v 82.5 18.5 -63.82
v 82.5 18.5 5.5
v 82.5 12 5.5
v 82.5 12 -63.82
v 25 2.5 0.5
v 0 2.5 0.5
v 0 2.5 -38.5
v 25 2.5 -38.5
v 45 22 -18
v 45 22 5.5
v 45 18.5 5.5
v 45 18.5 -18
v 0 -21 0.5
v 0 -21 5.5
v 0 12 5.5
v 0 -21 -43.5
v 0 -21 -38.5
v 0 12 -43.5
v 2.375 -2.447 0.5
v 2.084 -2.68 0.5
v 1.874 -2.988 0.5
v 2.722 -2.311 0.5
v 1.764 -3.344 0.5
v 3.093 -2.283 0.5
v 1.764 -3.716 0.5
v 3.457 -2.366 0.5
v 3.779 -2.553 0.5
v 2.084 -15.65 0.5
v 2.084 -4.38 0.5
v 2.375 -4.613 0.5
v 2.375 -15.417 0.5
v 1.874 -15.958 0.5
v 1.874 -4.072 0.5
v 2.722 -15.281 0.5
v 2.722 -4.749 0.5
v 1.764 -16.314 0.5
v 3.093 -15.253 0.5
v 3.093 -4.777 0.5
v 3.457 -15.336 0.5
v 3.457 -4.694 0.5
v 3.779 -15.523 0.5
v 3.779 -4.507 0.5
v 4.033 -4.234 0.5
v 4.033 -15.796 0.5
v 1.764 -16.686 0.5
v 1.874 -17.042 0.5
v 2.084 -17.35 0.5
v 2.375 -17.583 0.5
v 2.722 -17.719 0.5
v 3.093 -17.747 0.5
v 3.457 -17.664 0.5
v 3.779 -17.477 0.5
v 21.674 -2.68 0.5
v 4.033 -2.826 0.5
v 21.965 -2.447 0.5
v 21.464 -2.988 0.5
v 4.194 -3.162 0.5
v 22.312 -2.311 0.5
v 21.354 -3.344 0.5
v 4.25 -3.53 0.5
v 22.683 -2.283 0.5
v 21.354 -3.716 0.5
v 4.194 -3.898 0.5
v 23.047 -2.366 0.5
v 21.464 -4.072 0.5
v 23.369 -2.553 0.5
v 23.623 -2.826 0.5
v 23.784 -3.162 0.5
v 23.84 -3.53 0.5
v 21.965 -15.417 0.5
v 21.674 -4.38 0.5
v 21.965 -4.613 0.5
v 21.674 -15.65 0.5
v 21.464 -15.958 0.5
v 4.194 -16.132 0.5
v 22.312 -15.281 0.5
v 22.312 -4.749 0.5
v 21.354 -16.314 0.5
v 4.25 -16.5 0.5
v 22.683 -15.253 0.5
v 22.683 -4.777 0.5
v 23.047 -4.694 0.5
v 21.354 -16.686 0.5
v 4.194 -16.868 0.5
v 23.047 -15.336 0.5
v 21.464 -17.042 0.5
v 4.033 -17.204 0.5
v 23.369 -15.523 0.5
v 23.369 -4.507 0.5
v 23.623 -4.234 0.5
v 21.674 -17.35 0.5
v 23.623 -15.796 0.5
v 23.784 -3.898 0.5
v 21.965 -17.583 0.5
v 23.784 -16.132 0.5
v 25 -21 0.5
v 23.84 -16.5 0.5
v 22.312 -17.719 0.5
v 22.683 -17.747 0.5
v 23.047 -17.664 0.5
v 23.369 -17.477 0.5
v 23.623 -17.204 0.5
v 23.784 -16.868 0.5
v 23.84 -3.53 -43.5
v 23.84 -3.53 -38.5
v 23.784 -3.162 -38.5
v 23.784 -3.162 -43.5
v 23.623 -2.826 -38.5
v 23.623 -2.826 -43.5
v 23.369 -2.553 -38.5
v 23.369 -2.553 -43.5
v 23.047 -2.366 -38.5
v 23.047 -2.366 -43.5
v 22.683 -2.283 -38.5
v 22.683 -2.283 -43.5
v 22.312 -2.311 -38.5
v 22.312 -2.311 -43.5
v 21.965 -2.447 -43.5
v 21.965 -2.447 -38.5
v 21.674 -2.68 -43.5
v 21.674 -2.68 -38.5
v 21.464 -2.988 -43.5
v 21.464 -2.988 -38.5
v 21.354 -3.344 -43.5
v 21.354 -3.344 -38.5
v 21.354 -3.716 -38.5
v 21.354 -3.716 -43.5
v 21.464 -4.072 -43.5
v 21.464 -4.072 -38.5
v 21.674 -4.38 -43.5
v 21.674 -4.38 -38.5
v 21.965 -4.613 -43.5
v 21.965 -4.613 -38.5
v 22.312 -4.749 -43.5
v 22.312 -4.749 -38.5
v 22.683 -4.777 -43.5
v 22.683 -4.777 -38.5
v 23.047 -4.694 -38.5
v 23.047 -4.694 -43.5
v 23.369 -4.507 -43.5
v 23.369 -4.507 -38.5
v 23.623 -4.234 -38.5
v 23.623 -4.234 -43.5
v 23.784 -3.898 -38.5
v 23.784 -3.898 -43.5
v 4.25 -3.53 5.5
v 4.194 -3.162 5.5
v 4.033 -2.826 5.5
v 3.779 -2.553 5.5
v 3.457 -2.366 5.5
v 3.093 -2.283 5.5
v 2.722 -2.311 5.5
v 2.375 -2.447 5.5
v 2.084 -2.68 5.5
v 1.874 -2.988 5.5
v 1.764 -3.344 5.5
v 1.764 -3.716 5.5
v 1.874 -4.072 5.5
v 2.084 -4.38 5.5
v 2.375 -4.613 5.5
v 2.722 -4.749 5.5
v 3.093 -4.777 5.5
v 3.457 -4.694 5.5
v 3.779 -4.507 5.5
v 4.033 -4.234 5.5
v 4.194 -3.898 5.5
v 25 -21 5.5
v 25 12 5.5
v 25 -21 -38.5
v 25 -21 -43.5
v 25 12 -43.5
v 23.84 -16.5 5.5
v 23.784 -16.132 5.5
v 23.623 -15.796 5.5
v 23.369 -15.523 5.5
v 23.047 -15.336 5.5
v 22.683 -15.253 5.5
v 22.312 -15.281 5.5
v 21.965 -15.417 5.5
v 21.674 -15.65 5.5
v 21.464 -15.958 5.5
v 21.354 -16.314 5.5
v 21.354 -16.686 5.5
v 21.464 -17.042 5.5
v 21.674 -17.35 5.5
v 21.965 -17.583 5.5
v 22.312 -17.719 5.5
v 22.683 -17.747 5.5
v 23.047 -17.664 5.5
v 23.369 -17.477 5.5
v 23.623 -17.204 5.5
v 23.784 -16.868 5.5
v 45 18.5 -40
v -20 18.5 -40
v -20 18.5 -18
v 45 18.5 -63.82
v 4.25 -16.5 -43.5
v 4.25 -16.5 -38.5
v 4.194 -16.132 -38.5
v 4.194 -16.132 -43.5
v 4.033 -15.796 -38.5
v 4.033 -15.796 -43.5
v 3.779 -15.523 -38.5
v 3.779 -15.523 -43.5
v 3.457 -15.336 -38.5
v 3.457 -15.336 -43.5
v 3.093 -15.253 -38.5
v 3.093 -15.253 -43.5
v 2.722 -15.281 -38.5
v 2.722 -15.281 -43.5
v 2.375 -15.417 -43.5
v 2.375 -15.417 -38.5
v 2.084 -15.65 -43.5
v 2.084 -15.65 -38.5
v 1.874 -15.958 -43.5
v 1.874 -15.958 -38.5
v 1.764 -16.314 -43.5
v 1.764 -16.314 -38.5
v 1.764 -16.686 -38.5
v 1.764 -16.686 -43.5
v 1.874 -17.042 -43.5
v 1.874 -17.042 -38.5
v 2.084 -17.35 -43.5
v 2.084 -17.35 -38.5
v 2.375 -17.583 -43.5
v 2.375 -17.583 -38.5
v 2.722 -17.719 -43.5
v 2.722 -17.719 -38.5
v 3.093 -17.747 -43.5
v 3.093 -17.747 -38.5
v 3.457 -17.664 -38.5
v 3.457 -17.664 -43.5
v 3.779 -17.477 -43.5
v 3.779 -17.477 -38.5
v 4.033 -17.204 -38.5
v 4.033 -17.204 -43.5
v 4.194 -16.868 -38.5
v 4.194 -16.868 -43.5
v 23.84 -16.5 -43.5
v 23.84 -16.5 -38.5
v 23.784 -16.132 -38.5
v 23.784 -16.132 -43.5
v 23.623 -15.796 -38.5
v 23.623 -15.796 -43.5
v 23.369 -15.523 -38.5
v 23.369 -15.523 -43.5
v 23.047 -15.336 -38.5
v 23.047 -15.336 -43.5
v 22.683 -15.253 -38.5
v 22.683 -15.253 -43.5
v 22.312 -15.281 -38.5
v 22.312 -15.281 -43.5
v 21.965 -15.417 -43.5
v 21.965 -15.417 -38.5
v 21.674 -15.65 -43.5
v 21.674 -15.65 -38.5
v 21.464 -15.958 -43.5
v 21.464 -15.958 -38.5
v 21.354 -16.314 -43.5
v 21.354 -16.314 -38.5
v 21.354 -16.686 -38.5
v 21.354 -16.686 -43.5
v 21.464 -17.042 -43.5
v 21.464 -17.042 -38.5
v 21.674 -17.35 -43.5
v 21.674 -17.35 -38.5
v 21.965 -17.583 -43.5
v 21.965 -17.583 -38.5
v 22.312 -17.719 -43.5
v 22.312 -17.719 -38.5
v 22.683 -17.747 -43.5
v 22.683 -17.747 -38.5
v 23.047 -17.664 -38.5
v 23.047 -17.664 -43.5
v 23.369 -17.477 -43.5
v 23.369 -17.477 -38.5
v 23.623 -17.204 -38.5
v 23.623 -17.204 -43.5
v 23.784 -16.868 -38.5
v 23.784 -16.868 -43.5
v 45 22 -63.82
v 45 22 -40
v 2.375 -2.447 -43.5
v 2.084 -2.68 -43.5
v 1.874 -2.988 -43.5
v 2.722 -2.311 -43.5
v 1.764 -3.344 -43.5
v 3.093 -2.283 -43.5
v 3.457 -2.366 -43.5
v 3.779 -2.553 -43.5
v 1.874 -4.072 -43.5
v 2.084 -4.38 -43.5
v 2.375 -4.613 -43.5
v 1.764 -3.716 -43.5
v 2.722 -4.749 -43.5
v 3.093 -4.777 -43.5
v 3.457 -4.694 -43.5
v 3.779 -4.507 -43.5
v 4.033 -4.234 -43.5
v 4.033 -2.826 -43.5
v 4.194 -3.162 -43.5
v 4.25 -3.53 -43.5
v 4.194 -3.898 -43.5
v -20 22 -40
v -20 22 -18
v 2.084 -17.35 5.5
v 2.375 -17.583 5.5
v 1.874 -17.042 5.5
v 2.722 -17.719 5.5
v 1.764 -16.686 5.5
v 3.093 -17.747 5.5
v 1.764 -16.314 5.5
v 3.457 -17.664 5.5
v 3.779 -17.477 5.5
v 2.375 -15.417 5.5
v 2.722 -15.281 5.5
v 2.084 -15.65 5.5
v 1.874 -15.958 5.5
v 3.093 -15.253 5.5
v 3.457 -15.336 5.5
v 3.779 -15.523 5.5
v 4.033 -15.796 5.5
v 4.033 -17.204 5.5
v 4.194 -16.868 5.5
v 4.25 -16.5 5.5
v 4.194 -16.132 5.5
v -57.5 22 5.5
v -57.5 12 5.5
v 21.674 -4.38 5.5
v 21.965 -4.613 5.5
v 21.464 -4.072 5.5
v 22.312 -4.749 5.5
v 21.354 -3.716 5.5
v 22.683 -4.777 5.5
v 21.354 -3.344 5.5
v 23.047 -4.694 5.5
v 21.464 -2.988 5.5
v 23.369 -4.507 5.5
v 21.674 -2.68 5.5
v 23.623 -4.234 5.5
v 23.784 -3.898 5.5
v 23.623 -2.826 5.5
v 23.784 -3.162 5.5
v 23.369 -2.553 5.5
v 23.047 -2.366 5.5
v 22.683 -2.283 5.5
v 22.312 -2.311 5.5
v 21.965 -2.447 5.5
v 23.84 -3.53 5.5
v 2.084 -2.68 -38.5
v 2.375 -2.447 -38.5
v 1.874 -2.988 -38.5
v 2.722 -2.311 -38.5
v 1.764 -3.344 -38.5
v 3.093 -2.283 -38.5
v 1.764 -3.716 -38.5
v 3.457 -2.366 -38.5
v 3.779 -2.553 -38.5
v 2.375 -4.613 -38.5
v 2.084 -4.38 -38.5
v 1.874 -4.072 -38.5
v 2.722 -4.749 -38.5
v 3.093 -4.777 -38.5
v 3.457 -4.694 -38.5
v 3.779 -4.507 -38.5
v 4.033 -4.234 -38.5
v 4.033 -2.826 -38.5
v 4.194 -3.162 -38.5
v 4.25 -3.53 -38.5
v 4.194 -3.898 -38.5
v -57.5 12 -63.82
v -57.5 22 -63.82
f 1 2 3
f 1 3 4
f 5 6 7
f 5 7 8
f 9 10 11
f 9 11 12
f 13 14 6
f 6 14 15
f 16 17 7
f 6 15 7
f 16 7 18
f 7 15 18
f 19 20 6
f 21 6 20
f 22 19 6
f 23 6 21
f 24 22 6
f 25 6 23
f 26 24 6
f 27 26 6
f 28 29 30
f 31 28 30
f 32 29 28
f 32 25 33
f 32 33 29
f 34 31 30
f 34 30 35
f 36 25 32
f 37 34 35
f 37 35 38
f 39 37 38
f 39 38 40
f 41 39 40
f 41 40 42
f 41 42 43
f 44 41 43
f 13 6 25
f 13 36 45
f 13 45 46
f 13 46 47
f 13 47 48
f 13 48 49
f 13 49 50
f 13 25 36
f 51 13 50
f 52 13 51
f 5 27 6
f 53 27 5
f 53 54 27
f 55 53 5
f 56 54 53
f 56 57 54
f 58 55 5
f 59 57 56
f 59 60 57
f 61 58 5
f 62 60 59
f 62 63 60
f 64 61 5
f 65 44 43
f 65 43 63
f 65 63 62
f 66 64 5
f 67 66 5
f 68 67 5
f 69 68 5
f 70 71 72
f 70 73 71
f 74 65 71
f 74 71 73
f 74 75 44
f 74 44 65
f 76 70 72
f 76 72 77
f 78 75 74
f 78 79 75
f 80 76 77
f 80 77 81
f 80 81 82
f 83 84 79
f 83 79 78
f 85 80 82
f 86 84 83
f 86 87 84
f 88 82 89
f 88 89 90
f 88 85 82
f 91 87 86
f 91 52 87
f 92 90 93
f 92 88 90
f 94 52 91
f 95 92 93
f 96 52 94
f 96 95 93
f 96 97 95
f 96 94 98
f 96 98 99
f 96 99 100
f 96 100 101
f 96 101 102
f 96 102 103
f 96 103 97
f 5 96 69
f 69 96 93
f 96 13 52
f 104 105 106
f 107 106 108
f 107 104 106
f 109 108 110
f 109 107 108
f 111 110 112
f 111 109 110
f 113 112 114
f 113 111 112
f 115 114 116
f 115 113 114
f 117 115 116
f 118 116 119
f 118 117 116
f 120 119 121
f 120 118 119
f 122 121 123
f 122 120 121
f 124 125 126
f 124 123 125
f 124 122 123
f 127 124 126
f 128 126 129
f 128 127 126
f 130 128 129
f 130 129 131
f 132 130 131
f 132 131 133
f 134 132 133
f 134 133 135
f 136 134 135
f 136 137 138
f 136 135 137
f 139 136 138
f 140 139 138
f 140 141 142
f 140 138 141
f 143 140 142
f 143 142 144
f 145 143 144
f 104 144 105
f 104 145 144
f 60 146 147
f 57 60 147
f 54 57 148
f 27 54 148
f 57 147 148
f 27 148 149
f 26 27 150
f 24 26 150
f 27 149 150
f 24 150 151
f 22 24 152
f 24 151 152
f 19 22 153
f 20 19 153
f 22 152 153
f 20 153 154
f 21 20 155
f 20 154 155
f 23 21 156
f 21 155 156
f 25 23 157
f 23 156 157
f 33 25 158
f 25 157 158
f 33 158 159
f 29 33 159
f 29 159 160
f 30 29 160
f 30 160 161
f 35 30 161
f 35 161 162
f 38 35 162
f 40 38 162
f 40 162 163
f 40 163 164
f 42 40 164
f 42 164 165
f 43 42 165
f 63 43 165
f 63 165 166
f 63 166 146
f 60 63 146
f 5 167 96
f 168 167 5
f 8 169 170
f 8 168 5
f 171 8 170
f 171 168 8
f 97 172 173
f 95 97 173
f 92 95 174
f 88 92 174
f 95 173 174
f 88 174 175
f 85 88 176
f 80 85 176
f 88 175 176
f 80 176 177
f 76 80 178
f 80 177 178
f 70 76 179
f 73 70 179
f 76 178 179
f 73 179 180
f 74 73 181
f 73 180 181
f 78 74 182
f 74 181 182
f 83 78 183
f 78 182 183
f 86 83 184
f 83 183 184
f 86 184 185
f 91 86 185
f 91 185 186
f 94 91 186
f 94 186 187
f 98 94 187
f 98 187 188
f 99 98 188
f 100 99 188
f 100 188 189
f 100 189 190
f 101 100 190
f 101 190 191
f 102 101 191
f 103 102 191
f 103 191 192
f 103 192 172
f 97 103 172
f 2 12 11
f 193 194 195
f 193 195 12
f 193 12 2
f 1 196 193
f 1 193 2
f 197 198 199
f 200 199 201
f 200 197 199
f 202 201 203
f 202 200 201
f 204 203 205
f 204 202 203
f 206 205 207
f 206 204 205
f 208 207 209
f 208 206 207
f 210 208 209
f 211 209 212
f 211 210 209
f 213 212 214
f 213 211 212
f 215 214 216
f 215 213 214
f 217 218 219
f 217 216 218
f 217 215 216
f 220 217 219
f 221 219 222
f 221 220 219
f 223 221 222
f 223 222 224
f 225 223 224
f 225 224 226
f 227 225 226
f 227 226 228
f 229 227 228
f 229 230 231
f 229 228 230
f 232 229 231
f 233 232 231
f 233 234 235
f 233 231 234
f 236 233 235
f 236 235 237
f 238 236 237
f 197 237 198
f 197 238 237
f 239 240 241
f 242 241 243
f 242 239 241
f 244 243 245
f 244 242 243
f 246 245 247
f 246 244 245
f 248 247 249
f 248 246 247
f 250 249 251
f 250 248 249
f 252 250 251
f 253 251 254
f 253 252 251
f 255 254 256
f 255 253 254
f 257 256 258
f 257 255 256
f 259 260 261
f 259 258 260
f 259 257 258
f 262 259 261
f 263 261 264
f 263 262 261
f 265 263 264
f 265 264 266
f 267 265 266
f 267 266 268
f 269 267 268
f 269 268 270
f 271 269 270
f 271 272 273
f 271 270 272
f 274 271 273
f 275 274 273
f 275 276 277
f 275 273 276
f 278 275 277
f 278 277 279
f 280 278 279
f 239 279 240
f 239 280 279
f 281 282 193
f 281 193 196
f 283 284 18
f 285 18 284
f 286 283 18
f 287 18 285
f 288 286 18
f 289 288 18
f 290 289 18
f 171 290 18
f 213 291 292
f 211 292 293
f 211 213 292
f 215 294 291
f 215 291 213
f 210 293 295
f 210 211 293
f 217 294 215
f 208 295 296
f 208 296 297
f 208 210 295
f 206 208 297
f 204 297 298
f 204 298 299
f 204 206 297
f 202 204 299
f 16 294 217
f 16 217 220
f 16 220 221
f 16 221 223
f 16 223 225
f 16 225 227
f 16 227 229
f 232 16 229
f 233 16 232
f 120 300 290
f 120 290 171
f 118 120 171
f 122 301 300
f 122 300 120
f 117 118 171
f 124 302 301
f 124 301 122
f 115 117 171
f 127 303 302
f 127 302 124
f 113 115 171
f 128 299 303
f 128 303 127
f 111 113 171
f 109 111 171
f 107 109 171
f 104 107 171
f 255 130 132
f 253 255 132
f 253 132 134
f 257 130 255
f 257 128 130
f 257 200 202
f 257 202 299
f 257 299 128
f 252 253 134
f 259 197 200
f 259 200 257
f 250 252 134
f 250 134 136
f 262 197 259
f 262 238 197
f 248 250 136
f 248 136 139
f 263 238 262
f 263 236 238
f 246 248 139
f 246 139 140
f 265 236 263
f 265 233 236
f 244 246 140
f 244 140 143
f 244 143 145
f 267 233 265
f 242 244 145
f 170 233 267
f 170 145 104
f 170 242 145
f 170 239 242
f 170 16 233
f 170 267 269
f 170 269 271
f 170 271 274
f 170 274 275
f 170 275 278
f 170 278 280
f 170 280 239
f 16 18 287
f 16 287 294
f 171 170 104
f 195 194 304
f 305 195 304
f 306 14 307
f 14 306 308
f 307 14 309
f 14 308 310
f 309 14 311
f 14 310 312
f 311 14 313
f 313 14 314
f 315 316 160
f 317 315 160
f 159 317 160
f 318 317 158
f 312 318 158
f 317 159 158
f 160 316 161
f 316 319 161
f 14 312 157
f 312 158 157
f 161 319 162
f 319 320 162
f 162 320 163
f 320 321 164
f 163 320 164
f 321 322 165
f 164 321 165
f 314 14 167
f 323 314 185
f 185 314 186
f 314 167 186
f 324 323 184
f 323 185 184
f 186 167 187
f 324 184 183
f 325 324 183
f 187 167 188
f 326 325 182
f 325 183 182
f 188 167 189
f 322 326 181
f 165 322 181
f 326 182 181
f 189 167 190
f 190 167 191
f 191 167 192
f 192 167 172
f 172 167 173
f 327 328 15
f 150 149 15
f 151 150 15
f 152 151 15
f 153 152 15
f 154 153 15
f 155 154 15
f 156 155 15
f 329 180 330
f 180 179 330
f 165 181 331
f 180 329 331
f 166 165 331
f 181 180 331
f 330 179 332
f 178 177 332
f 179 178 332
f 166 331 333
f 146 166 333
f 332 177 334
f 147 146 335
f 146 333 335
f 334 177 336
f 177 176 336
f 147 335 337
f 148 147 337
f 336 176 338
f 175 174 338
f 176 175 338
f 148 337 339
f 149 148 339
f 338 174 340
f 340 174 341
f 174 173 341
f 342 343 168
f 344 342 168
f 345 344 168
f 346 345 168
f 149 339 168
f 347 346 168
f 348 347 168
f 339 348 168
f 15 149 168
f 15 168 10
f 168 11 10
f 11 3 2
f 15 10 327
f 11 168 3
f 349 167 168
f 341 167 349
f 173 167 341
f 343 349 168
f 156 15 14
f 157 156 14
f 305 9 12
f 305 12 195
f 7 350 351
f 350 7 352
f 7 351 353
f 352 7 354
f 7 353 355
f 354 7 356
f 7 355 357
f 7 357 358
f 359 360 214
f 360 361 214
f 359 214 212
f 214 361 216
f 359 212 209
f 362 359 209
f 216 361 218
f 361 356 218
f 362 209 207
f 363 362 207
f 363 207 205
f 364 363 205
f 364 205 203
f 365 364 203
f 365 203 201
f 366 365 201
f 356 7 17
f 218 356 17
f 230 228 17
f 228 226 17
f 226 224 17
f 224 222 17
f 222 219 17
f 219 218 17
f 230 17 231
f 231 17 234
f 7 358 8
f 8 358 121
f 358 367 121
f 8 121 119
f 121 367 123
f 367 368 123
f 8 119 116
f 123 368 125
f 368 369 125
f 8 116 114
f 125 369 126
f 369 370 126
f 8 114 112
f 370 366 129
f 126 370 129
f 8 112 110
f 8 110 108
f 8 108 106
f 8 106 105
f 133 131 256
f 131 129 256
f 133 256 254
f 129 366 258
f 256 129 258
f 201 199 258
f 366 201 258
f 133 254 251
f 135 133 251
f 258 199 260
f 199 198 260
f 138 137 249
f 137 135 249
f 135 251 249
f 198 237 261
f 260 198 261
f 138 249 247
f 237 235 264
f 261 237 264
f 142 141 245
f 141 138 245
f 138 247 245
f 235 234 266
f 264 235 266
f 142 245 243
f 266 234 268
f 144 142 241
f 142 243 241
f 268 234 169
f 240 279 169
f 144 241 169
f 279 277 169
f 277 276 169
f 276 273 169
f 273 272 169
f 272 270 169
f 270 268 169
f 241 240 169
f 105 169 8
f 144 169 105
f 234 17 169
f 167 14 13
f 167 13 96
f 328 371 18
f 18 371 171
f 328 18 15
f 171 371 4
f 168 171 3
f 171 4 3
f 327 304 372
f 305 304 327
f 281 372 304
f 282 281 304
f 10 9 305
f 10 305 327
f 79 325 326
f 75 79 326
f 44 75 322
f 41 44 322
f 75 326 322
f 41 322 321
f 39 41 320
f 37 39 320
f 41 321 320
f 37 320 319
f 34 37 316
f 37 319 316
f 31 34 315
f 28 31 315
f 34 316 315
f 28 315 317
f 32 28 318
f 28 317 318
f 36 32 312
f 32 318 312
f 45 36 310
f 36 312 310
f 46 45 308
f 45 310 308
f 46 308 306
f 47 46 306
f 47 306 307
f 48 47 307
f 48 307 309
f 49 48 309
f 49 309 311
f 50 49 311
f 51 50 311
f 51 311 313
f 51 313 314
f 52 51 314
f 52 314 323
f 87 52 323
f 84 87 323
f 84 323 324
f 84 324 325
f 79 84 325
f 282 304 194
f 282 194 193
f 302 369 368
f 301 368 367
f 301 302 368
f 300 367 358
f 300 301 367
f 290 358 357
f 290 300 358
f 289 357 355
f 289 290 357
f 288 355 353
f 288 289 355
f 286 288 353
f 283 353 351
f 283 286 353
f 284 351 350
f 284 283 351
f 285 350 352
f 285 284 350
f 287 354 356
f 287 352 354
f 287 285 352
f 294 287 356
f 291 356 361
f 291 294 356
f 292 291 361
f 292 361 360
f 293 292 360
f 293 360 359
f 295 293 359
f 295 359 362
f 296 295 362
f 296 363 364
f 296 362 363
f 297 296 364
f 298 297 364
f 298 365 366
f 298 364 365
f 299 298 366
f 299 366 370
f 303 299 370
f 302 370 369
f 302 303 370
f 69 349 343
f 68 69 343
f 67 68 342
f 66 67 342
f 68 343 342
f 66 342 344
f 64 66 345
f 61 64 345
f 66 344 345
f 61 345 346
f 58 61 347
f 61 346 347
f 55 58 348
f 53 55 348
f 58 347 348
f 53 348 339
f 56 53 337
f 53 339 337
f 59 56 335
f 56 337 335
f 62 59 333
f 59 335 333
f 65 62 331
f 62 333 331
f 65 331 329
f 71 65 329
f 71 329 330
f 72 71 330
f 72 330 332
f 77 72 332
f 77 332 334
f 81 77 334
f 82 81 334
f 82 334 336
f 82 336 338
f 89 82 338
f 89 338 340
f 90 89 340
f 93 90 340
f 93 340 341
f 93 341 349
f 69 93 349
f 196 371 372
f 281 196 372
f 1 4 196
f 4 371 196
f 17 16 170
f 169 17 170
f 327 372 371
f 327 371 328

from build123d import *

# Parameters (mm, degrees)
SKETCH1_W           = 25
SKETCH1_H           = 38
BOSS_EXTRUDE1_DEPTH = 12
SKETCH3_W           = 25
SKETCH3_H           = 12
BOSS_EXTRUDE2_DEPTH = 5.5
SKETCH5_W           = 25
SKETCH5_H           = 5
BOSS_EXTRUDE3_DEPTH = 21
SKETCH6_R           = 1.25
CUT_EXTRUDE1_DEPTH  = 10
SKETCH7_W           = 75
SKETCH7_H           = 49
BOSS_EXTRUDE4_DEPTH = 10
SKETCH8_W           = 65
SKETCH8_H           = 12
CUT_EXTRUDE2_DEPTH  = 3.5
SKETCH11_W          = 25
SKETCH11_H          = 39
CUT_EXTRUDE4_DEPTH  = 2.5
SKETCH12_W          = 75
SKETCH12_H          = 10
BOSS_EXTRUDE6_DEPTH = 20.32
SKETCH15_W          = 69.32
SKETCH15_H          = 10
BOSS_EXTRUDE7_DEPTH = 32.5
SKETCH16_W          = 69.32
SKETCH16_H          = 10
BOSS_EXTRUDE8_DEPTH = 32.5
SKETCH19_W          = 12
SKETCH19_H          = 3.5
CUT_EXTRUDE6_DEPTH  = 38.5
SKETCH23_W          = 102.5
SKETCH23_H          = 3.5
CUT_EXTRUDE7_DEPTH  = 5
SKETCH24_W          = 102.5
SKETCH24_H          = 3.5
CUT_EXTRUDE8_DEPTH  = 5
SKETCH25_W          = 37.5
SKETCH25_H          = 69.32
CUT_EXTRUDE9_DEPTH  = 3.5


with BuildPart() as part:
    # Sketch1 → Boss-Extrude1 (new body)
    with BuildSketch(Plane(origin=(0, 0, 0), x_dir=(1, 0, 0), z_dir=(0, 1, 0))):
        with Locations((12.5, 19)):
            Rectangle(SKETCH1_W, SKETCH1_H)
    extrude(amount=BOSS_EXTRUDE1_DEPTH)

    # Sketch3 → Boss-Extrude2 (add)
    with BuildSketch(Plane.XY):
        with Locations((12.5, 6)):
            Rectangle(SKETCH3_W, SKETCH3_H)
    boss_extrude2 = extrude(amount=BOSS_EXTRUDE2_DEPTH)

    # Sketch5 → Boss-Extrude3 (add)
    with BuildSketch(Plane.XZ):
        with Locations((12.5, 3)):
            Rectangle(SKETCH5_W, SKETCH5_H)
    boss_extrude3 = extrude(amount=BOSS_EXTRUDE3_DEPTH)

    # Sketch6 → Cut-Extrude1 (cut)
    with BuildSketch(Plane.XY.offset(5.5)):
        with Locations((3, -16.5)):
            Circle(SKETCH6_R)
        with Locations((22.59, -16.5)):
            Circle(SKETCH6_R)
        with Locations((22.59, -3.53)):
            Circle(SKETCH6_R)
        with Locations((3, -3.53)):
            Circle(SKETCH6_R)
    cut_extrude1 = extrude(amount=-CUT_EXTRUDE1_DEPTH, mode=Mode.SUBTRACT)

    # Mirror1: Boss-Extrude2, Boss-Extrude3, Cut-Extrude1 across plane
    add(boss_extrude2.mirror(Plane.XY.offset(-19)))
    add(boss_extrude3.mirror(Plane.XY.offset(-19)))
    add(cut_extrude1.mirror(Plane.XY.offset(-19)), mode=Mode.SUBTRACT)

    # Sketch7 → Boss-Extrude4 (add)
    with BuildSketch(Plane(origin=(0, 12, 0), x_dir=(1, 0, 0), z_dir=(0, 1, 0))):
        with Locations((12.5, 19)):
            Rectangle(SKETCH7_W, SKETCH7_H)
    extrude(amount=BOSS_EXTRUDE4_DEPTH)

    # Sketch8 → Cut-Extrude2 (cut)
    with BuildSketch(Plane(origin=(0, 22, 0), x_dir=(1, 0, 0), z_dir=(0, 1, 0))):
        with Locations((12.5, 29)):
            Rectangle(SKETCH8_W, SKETCH8_H)
    extrude(amount=-CUT_EXTRUDE2_DEPTH, mode=Mode.SUBTRACT)

    # Sketch11 → Cut-Extrude4 (cut)
    with BuildSketch(Plane.XZ):
        with Locations((12.5, -19)):
            Rectangle(SKETCH11_W, SKETCH11_H)
    extrude(amount=-CUT_EXTRUDE4_DEPTH, mode=Mode.SUBTRACT)

    # Sketch12 → Boss-Extrude6 (add)
    with BuildSketch(Plane(origin=(0, 0, -43.5), x_dir=(-1, 0, 0), z_dir=(0, 0, -1))):
        with Locations((-12.5, 17)):
            Rectangle(SKETCH12_W, SKETCH12_H)
    extrude(amount=BOSS_EXTRUDE6_DEPTH)

    # Sketch15 → Boss-Extrude7 (add)
    with BuildSketch(Plane(origin=(50, 0, 0), x_dir=(0, 0, -1), z_dir=(1, 0, 0))):
        with Locations((29.16, 17)):
            Rectangle(SKETCH15_W, SKETCH15_H)
    extrude(amount=BOSS_EXTRUDE7_DEPTH)

    # Sketch16 → Boss-Extrude8 (add)
    with BuildSketch(Plane.ZY.offset(25)):
        with Locations((-29.16, 17)):
            Rectangle(SKETCH16_W, SKETCH16_H)
    extrude(amount=BOSS_EXTRUDE8_DEPTH)

    # Sketch19 → Cut-Extrude6 (cut, through all)
    with BuildSketch(Plane.ZY.offset(-45)):
        with Locations((-29, 20.25)):
            Rectangle(SKETCH19_W, SKETCH19_H)
    extrude(amount=-CUT_EXTRUDE6_DEPTH, mode=Mode.SUBTRACT)

    # Sketch23 → Cut-Extrude7 (cut)
    with BuildSketch(Plane.XY.offset(-35)):
        with Locations((31.25, 20.25)):
            Rectangle(SKETCH23_W, SKETCH23_H)
    extrude(amount=-CUT_EXTRUDE7_DEPTH, mode=Mode.SUBTRACT)

    # Sketch24 → Cut-Extrude8 (cut)
    with BuildSketch(Plane(origin=(0, 0, -23), x_dir=(-1, 0, 0), z_dir=(0, 0, -1))):
        with Locations((-31.25, 20.25)):
            Rectangle(SKETCH24_W, SKETCH24_H)
    extrude(amount=-CUT_EXTRUDE8_DEPTH, mode=Mode.SUBTRACT)

    # Sketch25 → Cut-Extrude9 (cut)
    with BuildSketch(Plane(origin=(0, 22, 0), x_dir=(1, 0, 0), z_dir=(0, 1, 0))):
        with Locations((63.75, 29.16)):
            Rectangle(SKETCH25_W, SKETCH25_H)
    extrude(amount=-CUT_EXTRUDE9_DEPTH, mode=Mode.SUBTRACT)


solid = part.part
